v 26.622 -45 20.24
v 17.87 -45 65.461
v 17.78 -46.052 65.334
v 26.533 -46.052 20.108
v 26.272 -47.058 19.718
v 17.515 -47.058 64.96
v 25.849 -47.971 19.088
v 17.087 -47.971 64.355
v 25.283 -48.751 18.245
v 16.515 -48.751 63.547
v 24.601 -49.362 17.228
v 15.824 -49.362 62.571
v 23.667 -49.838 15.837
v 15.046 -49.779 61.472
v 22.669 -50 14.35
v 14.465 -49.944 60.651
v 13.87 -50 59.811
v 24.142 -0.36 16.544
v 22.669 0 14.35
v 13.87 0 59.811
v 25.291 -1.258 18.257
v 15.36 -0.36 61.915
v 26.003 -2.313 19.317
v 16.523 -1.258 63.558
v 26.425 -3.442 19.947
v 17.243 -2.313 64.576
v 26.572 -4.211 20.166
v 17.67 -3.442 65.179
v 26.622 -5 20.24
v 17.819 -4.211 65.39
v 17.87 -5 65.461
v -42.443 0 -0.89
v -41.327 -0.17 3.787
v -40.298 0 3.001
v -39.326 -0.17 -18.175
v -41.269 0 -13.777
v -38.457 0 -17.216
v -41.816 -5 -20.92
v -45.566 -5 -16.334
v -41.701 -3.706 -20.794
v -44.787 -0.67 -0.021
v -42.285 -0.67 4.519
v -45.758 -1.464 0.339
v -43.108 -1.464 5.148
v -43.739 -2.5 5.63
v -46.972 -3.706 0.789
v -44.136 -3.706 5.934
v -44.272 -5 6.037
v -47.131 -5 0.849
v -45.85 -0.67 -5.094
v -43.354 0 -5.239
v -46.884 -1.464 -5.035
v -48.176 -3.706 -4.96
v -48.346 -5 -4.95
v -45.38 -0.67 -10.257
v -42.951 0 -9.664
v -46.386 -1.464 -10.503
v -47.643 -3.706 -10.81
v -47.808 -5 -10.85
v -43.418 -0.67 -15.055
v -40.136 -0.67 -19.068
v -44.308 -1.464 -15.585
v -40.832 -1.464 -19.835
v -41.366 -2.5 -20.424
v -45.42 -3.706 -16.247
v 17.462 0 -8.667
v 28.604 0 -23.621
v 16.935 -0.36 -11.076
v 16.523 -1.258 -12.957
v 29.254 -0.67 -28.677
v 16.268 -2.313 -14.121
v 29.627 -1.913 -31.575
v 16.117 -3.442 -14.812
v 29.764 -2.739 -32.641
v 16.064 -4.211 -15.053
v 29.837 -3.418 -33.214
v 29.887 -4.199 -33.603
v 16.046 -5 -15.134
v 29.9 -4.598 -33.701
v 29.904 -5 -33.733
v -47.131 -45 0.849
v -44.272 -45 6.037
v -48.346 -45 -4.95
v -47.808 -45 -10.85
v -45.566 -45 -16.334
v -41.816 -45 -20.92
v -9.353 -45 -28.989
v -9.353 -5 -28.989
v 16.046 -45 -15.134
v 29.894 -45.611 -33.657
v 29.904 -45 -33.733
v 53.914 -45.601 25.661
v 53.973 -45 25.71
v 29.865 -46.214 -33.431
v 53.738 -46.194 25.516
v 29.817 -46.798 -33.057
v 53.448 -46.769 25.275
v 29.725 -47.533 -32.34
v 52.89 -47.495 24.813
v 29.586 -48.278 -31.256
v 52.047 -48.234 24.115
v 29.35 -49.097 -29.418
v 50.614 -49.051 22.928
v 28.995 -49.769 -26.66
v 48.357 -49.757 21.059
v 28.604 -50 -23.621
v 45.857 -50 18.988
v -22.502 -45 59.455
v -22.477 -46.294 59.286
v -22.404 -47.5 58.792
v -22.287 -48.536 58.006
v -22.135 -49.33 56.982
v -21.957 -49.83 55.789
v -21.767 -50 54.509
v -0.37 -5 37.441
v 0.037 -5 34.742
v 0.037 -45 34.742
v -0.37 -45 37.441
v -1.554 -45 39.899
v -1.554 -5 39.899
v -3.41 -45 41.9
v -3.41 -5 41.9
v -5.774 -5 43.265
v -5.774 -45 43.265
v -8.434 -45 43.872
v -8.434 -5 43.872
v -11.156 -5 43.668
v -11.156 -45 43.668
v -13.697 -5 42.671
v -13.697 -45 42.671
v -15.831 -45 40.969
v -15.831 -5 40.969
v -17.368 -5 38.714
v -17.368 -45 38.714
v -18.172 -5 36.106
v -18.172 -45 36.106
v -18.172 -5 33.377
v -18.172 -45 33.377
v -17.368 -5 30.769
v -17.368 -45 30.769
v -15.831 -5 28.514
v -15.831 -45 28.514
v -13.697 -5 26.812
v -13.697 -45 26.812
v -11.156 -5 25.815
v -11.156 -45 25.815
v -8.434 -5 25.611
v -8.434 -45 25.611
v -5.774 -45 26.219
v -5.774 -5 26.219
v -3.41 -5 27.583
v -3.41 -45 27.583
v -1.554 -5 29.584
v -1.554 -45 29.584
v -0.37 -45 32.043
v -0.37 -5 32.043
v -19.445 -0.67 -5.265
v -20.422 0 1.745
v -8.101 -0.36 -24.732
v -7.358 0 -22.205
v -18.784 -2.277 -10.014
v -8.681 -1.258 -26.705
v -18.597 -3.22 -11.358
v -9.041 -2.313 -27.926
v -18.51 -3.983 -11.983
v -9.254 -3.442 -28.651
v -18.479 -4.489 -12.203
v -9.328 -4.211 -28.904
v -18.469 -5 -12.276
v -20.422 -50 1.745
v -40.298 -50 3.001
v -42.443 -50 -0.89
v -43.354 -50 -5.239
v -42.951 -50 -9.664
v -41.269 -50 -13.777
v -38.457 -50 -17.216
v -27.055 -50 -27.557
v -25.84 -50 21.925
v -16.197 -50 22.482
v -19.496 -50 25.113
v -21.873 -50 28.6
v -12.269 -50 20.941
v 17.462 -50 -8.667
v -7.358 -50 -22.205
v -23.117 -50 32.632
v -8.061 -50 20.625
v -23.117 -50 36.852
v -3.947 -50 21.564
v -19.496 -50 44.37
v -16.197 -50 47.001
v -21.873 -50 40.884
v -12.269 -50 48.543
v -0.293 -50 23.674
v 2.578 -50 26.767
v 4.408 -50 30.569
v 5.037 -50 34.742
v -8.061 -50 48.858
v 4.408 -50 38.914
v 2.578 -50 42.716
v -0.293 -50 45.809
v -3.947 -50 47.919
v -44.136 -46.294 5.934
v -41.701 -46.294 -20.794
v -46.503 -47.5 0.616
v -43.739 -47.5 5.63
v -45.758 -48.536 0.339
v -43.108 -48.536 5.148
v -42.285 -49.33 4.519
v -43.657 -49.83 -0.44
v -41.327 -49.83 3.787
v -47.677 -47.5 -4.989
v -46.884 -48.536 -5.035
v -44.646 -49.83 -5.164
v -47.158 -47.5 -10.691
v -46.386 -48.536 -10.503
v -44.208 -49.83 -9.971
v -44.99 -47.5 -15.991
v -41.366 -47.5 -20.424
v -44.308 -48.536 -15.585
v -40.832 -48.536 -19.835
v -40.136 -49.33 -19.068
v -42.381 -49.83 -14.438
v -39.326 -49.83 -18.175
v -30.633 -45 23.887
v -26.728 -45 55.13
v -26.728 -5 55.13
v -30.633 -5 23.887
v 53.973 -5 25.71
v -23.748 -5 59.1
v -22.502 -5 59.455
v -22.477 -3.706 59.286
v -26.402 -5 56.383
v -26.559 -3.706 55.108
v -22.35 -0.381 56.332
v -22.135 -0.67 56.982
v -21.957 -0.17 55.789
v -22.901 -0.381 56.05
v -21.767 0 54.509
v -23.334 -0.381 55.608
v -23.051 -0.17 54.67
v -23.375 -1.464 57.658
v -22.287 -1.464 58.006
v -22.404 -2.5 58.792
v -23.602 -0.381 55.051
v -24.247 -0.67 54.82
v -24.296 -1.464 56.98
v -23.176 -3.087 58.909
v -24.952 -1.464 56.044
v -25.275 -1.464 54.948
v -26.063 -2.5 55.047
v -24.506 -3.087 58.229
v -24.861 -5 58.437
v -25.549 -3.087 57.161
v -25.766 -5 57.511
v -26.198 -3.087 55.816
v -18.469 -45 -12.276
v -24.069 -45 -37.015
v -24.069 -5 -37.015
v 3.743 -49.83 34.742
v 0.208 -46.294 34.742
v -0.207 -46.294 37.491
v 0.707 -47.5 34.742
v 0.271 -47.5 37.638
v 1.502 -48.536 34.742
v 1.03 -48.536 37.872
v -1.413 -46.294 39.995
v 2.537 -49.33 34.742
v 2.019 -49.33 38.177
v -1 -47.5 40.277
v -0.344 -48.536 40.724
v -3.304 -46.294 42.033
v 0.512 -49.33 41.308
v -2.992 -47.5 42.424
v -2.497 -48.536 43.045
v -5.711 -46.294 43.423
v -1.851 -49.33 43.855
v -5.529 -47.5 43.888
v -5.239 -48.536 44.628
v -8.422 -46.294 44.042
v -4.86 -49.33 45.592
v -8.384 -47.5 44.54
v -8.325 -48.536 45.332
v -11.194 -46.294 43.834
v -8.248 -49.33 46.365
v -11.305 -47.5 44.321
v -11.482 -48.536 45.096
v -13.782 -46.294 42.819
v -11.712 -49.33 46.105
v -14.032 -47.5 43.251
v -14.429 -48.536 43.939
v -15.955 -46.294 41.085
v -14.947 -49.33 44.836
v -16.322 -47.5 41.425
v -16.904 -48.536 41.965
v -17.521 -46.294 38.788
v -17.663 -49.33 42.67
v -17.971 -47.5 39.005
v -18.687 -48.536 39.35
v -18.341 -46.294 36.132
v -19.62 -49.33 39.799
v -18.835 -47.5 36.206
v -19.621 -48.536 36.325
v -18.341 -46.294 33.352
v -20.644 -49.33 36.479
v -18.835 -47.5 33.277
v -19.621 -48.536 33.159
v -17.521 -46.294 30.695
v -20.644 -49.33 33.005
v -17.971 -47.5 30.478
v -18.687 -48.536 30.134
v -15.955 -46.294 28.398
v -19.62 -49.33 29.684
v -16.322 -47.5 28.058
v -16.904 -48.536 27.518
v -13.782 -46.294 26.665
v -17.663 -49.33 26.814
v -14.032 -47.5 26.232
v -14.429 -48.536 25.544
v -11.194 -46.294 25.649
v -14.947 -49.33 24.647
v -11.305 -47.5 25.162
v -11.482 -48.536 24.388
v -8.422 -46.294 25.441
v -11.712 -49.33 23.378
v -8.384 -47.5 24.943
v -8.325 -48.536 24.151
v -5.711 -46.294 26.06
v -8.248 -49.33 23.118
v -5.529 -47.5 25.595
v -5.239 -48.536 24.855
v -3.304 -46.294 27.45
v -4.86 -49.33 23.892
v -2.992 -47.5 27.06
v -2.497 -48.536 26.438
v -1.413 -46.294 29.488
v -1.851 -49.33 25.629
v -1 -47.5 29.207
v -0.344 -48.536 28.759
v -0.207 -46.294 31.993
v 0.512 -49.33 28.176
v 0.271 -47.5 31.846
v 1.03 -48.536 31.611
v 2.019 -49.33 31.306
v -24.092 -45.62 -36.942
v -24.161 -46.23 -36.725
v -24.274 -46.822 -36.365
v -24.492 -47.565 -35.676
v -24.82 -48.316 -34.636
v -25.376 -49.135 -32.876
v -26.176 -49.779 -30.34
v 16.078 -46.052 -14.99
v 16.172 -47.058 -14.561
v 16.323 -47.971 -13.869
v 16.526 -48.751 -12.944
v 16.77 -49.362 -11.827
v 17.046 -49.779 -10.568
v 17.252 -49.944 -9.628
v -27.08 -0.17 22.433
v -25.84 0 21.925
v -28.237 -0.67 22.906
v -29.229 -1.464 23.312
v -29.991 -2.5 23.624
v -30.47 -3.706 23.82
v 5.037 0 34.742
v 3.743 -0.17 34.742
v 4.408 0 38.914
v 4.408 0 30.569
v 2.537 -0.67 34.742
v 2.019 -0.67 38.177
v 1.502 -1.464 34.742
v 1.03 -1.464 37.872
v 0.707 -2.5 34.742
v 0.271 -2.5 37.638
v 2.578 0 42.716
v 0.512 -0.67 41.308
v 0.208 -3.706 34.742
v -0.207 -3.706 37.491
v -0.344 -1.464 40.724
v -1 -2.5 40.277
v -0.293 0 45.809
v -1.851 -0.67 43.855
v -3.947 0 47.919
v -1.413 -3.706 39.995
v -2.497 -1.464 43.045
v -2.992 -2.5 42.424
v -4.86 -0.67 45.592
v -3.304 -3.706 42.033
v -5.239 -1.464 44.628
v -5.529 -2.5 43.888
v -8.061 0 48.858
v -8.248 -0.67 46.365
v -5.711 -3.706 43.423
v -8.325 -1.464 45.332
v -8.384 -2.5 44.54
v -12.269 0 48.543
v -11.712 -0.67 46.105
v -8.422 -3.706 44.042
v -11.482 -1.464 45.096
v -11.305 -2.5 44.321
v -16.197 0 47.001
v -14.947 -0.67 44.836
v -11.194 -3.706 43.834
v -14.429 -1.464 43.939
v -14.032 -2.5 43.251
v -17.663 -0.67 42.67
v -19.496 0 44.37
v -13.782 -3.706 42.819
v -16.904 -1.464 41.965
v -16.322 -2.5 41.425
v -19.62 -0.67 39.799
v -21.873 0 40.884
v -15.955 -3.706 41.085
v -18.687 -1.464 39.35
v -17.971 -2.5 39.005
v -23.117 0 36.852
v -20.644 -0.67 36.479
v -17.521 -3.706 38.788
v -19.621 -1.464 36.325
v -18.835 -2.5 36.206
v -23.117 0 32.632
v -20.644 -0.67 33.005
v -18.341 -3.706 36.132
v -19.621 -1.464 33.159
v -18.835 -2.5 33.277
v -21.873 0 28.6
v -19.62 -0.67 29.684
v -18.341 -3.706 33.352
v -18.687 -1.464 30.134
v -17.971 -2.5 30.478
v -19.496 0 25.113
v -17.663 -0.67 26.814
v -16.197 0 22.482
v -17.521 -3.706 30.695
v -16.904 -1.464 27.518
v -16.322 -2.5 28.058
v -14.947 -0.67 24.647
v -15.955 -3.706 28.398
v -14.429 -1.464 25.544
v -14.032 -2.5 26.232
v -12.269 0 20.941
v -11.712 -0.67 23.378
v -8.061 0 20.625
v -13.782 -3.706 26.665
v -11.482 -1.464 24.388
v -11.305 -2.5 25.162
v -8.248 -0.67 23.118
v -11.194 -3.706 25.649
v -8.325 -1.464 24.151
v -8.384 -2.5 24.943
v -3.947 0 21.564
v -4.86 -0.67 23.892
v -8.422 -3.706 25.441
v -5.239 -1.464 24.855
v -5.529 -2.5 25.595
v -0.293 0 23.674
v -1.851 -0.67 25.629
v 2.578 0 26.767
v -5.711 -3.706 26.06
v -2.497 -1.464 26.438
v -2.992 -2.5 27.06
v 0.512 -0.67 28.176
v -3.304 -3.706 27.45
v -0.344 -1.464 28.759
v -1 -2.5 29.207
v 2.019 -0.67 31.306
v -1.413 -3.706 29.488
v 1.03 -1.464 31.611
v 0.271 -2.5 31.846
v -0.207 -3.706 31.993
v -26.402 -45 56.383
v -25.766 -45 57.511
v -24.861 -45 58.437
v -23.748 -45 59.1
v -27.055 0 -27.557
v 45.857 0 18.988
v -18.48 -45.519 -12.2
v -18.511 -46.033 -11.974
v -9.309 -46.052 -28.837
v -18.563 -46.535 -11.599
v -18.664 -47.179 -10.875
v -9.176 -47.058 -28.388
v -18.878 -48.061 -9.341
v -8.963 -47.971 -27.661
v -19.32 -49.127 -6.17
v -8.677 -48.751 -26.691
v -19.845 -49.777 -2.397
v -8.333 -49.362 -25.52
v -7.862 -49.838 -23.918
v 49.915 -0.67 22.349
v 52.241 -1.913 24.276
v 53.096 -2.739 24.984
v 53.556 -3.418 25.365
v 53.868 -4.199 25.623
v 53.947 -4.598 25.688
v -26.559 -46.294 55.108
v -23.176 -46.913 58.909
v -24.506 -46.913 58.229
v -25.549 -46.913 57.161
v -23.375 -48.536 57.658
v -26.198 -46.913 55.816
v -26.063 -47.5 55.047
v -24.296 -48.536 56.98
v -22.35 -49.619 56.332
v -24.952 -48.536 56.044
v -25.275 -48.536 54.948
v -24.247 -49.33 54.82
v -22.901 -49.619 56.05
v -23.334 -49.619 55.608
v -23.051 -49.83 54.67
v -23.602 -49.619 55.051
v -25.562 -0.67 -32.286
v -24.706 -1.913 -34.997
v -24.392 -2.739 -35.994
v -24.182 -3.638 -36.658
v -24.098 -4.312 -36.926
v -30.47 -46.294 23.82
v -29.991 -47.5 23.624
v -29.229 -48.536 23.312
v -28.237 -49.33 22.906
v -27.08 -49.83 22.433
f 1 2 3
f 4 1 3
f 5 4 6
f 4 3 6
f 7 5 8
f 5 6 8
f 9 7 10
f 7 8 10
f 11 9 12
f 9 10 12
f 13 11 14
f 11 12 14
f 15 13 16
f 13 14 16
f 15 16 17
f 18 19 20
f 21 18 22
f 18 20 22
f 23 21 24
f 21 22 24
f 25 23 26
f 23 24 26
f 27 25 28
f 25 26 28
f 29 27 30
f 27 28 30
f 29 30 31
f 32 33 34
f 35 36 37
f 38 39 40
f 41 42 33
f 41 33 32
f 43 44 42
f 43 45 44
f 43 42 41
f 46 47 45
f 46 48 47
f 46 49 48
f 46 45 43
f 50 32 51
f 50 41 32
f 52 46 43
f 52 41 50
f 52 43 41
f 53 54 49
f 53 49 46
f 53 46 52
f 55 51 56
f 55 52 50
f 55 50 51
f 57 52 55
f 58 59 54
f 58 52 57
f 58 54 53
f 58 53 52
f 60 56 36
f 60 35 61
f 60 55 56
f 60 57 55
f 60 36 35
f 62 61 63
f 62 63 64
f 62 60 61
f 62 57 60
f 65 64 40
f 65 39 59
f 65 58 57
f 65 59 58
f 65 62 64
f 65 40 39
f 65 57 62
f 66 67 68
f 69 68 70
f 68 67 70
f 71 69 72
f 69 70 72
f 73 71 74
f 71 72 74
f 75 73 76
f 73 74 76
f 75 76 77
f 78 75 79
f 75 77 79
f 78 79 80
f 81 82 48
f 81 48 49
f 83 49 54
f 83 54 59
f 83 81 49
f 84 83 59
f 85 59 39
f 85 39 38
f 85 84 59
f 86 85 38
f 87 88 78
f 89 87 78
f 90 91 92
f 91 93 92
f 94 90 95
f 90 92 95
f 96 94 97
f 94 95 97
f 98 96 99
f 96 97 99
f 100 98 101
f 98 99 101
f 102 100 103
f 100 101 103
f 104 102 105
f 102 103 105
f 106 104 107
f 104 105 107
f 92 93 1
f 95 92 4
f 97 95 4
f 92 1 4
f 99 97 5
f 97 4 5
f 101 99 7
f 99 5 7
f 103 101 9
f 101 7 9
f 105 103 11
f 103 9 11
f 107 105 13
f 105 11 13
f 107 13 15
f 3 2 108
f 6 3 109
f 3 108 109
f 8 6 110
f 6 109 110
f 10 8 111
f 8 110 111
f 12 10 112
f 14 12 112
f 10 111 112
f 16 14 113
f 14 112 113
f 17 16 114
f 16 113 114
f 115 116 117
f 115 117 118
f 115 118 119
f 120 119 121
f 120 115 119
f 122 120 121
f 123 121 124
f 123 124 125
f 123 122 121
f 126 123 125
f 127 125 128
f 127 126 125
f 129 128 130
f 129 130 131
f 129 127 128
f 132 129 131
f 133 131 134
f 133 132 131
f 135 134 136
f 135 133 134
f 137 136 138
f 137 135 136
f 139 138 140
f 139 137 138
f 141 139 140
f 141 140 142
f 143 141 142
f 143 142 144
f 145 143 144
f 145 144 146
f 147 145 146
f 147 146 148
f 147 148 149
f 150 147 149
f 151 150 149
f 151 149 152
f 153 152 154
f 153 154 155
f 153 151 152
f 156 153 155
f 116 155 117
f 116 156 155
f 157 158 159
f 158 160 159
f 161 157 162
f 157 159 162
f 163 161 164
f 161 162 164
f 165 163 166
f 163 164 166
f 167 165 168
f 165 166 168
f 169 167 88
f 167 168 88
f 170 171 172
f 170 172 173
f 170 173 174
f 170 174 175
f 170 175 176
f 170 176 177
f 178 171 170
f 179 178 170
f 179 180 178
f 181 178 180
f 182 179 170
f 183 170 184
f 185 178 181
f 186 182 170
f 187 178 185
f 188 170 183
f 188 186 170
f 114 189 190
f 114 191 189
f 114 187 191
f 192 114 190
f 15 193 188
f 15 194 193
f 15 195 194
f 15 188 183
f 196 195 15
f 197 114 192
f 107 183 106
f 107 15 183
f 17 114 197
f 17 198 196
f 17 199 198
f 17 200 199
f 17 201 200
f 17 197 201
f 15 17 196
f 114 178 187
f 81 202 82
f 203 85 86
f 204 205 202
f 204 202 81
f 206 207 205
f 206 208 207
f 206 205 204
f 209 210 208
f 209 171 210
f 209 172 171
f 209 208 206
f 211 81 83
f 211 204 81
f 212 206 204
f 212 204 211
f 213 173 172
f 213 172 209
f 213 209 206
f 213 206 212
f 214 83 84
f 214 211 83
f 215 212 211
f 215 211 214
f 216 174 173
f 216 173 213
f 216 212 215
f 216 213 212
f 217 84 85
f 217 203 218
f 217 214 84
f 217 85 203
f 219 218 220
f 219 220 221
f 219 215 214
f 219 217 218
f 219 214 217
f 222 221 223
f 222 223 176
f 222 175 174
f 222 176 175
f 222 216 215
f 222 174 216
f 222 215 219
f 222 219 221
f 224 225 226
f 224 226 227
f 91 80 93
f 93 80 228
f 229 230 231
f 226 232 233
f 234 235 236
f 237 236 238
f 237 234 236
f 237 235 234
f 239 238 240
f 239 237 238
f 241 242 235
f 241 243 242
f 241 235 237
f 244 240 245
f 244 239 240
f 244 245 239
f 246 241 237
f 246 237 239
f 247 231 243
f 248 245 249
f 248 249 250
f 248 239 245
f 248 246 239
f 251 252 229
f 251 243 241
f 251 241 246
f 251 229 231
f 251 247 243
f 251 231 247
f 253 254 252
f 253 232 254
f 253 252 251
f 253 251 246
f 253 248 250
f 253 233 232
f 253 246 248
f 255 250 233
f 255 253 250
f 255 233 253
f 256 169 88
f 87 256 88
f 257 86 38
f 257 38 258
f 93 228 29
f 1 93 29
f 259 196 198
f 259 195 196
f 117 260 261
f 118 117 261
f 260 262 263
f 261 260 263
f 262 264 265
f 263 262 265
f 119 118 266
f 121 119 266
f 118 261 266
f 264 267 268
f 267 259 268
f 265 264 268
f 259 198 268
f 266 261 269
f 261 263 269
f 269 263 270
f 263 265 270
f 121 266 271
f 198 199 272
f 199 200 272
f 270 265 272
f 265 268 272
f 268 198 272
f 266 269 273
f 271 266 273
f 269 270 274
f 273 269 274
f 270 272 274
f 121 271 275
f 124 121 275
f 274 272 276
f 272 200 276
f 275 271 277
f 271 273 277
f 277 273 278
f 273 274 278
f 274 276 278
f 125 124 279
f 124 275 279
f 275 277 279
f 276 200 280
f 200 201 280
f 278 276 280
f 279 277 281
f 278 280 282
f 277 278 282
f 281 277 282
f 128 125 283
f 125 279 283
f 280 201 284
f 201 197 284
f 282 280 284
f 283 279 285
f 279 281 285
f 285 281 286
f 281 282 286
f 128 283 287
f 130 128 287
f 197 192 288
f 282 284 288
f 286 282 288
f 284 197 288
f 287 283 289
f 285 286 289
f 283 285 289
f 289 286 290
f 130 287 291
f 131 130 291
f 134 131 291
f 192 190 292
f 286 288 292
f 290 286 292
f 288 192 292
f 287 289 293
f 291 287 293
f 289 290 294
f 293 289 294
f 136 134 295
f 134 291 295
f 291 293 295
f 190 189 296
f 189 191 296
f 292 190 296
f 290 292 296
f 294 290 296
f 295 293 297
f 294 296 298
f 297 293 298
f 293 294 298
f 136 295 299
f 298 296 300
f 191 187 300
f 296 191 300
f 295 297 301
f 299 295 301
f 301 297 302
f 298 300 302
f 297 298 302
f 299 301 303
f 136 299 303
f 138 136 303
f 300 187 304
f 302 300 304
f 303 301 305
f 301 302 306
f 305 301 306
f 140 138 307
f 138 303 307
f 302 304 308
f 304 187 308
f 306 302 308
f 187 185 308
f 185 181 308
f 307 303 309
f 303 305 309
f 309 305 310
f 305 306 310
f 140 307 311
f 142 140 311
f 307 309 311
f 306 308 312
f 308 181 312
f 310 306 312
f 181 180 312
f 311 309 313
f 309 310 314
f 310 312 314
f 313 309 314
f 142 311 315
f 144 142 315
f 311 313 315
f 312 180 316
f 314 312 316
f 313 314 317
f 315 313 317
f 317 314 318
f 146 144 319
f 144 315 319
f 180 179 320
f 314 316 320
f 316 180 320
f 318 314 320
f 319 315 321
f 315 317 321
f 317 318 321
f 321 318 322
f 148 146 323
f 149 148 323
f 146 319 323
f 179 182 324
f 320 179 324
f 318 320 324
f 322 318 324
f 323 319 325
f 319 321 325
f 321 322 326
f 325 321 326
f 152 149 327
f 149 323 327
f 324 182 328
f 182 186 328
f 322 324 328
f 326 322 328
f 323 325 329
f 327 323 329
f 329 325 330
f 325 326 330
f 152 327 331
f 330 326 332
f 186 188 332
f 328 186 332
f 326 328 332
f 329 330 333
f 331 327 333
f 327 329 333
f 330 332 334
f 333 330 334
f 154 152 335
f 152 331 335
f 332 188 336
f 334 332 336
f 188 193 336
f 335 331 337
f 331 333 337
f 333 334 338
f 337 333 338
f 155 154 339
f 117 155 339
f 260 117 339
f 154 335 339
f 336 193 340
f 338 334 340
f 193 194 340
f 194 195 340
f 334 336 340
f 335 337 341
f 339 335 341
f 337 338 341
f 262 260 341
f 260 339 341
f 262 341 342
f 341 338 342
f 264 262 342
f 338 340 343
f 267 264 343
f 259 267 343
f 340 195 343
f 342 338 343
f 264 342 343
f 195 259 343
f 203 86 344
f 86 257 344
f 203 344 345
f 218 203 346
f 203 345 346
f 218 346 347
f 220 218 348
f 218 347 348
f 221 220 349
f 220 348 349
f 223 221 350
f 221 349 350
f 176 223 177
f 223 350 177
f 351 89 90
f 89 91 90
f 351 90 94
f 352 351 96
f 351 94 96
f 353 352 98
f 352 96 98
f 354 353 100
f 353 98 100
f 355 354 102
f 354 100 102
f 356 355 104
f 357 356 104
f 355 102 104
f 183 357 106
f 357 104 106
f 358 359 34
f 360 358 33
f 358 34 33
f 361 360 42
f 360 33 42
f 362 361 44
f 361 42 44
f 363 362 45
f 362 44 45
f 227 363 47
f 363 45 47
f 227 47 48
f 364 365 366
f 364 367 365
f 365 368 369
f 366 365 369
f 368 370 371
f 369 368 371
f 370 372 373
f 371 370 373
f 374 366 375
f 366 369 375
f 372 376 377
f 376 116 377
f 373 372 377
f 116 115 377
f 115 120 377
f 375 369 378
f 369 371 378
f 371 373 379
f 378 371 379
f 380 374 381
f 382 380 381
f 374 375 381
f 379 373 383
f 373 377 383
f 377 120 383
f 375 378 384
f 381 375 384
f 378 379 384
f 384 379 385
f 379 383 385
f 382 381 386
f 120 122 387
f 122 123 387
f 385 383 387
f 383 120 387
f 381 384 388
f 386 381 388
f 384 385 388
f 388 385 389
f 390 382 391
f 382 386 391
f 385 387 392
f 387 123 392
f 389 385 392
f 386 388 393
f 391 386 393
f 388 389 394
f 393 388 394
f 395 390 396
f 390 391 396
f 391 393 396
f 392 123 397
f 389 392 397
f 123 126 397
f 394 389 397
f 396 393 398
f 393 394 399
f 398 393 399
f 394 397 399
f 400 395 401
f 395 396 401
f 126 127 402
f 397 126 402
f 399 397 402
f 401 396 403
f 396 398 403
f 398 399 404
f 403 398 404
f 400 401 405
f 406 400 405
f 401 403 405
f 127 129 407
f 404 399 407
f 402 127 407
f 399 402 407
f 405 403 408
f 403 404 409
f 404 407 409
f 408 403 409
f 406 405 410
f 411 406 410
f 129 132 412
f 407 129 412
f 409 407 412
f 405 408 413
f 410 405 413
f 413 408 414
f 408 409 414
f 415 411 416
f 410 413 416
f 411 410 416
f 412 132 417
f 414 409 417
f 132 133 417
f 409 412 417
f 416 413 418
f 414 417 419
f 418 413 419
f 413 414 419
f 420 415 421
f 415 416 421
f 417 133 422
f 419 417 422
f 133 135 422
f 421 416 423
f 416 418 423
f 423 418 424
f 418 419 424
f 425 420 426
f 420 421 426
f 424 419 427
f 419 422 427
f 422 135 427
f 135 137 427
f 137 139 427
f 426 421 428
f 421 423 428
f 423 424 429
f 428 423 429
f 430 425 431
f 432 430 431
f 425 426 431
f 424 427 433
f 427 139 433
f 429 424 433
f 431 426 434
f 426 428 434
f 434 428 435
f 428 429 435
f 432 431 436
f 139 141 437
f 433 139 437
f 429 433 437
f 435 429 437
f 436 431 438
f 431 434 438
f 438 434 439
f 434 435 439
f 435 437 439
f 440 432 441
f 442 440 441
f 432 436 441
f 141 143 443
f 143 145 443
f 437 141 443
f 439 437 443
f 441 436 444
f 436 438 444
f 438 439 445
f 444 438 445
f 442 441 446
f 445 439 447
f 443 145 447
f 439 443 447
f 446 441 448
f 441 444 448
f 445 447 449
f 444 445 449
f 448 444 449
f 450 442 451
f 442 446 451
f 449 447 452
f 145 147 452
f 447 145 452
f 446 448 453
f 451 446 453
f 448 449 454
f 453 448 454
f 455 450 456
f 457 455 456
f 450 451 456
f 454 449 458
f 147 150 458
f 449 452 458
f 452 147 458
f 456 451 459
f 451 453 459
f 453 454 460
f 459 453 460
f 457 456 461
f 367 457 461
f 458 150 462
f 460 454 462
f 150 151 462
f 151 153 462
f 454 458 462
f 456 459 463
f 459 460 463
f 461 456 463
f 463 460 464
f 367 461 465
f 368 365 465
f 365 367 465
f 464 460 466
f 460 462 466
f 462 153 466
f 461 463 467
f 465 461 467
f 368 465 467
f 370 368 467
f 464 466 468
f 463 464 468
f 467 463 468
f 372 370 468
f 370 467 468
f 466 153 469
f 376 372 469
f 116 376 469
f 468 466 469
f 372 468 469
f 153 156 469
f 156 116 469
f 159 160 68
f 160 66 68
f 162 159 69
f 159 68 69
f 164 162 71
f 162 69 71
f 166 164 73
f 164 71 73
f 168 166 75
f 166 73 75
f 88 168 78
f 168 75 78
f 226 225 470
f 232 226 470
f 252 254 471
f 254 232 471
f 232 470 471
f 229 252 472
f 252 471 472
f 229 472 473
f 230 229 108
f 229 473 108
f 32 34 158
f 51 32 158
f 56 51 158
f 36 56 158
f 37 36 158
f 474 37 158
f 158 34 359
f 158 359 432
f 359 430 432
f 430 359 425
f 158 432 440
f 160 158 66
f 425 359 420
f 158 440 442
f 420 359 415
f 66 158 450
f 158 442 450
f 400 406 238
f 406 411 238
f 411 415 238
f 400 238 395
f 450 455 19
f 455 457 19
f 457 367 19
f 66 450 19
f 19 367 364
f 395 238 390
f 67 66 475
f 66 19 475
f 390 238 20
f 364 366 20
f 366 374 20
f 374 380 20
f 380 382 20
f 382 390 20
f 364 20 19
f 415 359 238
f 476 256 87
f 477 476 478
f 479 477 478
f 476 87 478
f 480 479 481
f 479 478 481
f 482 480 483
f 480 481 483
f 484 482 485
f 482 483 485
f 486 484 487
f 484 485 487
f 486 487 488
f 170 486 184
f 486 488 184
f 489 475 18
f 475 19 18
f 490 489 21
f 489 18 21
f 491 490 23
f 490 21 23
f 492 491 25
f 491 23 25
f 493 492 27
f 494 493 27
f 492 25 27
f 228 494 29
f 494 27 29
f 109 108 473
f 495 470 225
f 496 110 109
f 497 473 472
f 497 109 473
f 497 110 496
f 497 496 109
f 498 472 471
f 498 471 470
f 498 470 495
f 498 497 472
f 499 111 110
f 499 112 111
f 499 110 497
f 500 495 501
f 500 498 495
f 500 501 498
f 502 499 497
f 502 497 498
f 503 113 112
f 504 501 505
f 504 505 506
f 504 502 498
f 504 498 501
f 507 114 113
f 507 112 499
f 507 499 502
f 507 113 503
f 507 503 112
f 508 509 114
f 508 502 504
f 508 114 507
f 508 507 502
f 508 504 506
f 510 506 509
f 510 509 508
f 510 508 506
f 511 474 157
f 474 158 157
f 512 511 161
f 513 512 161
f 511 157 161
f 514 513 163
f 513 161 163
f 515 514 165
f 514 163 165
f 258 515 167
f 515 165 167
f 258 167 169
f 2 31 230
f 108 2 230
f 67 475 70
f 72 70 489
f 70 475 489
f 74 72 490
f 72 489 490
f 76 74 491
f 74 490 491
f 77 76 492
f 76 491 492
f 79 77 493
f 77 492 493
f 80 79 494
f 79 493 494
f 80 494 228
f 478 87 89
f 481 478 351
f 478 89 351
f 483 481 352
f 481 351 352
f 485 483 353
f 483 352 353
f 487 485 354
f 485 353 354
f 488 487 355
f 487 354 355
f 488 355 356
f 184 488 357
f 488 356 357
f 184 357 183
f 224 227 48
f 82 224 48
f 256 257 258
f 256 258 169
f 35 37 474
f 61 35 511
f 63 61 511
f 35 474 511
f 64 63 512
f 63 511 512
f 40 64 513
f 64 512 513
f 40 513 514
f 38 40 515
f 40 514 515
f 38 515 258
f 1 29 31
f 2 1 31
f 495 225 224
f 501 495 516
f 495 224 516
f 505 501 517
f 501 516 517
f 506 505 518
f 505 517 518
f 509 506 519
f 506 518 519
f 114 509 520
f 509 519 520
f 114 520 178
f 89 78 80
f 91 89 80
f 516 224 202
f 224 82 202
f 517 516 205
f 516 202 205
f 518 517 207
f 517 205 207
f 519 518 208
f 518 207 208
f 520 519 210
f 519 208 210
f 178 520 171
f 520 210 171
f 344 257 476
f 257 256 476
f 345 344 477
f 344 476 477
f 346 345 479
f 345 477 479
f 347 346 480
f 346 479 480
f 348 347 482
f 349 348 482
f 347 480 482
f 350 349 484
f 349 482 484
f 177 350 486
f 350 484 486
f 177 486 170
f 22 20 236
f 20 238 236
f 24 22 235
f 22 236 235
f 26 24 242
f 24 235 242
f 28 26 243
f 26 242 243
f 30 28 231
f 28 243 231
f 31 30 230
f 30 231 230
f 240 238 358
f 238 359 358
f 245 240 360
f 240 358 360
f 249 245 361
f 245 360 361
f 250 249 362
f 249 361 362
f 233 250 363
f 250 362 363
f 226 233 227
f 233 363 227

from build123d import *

# Parameters (mm, degrees)
F0_R     = 9.1559693167
F1_DEPTH = 50
F2_R     = 20
F3_R     = 5
F4_R     = 5
F5_R     = 5


with BuildPart() as f1:
    # F0 (on Front) → F1 (new body)
    with BuildSketch(Plane.XZ):
        Polygon((-26.2572392821, 58.8964447379), (-30.6334458292, 23.8867942244), (-55.4319471121, -8.5700713098), (-24.0691360086, -37.0154157281), (-18.469100818, -12.2761549428), (-9.3532412677, -28.9885639891), (16.0460937768, -15.1343811303), (29.9040805548, -33.7332598865), (53.9732128382, 25.7102139294), (26.6219247133, 20.239956677), (17.8695097566, 65.4607564211), align=None)
        with Locations((-9.1187059879, 34.7417481244)):
            Circle(F0_R, mode=Mode.SUBTRACT)
    extrude(amount=F1_DEPTH)

    # F2
    f2_edges = [f1.edges().sort_by_distance(p)[0] for p in [
        (-55.431947, -25, -8.570071),
    ]]
    fillet(f2_edges, radius=F2_R)

    # F3
    f3_edges = [f1.edges().sort_by_distance(p)[0] for p in [
        (-26.257239, -25, 58.896445),
    ]]
    fillet(f3_edges, radius=F3_R)

    # F4
    f4_edges = [f1.edges().sort_by_distance(p)[0] for p in [
        (-37.452482, -50, 14.961878),
        (-48.296803, -50, -7.920016),
        (-2.31645, -50, 62.457885),
        (22.245717, -50, 42.850357),
        (40.297569, -50, 22.975085),
        (-28.68077, -50, 39.508202),
        (-25.343225, -50, 58.003503),
        (-32.942365, -50, -28.967603),
        (-21.269118, -50, -24.645785),
        (41.938647, -50, -4.011523),
        (-13.911171, -50, -20.632359),
        (22.975087, -50, -24.433821),
        (3.346426, -50, -22.061473),
        (-18.274675, -50, 34.741748),
    ]]
    fillet(f4_edges, radius=F4_R)

    # F5
    f5_edges = [f1.edges().sort_by_distance(p)[0] for p in [
        (22.245717, 0, 42.850357),
        (-2.31645, 0, 62.457885),
        (-25.343225, 0, 58.003503),
        (-28.68077, 0, 39.508202),
        (-37.452482, 0, 14.961878),
        (-48.296803, 0, -7.920016),
        (-32.942365, 0, -28.967603),
        (40.297569, 0, 22.975085),
        (-21.269118, 0, -24.645785),
        (41.938647, 0, -4.011523),
        (-13.911171, 0, -20.632359),
        (22.975087, 0, -24.433821),
        (3.346426, 0, -22.061473),
        (-18.274675, 0, 34.741748),
    ]]
    fillet(f5_edges, radius=F5_R)


solid = f1.part
